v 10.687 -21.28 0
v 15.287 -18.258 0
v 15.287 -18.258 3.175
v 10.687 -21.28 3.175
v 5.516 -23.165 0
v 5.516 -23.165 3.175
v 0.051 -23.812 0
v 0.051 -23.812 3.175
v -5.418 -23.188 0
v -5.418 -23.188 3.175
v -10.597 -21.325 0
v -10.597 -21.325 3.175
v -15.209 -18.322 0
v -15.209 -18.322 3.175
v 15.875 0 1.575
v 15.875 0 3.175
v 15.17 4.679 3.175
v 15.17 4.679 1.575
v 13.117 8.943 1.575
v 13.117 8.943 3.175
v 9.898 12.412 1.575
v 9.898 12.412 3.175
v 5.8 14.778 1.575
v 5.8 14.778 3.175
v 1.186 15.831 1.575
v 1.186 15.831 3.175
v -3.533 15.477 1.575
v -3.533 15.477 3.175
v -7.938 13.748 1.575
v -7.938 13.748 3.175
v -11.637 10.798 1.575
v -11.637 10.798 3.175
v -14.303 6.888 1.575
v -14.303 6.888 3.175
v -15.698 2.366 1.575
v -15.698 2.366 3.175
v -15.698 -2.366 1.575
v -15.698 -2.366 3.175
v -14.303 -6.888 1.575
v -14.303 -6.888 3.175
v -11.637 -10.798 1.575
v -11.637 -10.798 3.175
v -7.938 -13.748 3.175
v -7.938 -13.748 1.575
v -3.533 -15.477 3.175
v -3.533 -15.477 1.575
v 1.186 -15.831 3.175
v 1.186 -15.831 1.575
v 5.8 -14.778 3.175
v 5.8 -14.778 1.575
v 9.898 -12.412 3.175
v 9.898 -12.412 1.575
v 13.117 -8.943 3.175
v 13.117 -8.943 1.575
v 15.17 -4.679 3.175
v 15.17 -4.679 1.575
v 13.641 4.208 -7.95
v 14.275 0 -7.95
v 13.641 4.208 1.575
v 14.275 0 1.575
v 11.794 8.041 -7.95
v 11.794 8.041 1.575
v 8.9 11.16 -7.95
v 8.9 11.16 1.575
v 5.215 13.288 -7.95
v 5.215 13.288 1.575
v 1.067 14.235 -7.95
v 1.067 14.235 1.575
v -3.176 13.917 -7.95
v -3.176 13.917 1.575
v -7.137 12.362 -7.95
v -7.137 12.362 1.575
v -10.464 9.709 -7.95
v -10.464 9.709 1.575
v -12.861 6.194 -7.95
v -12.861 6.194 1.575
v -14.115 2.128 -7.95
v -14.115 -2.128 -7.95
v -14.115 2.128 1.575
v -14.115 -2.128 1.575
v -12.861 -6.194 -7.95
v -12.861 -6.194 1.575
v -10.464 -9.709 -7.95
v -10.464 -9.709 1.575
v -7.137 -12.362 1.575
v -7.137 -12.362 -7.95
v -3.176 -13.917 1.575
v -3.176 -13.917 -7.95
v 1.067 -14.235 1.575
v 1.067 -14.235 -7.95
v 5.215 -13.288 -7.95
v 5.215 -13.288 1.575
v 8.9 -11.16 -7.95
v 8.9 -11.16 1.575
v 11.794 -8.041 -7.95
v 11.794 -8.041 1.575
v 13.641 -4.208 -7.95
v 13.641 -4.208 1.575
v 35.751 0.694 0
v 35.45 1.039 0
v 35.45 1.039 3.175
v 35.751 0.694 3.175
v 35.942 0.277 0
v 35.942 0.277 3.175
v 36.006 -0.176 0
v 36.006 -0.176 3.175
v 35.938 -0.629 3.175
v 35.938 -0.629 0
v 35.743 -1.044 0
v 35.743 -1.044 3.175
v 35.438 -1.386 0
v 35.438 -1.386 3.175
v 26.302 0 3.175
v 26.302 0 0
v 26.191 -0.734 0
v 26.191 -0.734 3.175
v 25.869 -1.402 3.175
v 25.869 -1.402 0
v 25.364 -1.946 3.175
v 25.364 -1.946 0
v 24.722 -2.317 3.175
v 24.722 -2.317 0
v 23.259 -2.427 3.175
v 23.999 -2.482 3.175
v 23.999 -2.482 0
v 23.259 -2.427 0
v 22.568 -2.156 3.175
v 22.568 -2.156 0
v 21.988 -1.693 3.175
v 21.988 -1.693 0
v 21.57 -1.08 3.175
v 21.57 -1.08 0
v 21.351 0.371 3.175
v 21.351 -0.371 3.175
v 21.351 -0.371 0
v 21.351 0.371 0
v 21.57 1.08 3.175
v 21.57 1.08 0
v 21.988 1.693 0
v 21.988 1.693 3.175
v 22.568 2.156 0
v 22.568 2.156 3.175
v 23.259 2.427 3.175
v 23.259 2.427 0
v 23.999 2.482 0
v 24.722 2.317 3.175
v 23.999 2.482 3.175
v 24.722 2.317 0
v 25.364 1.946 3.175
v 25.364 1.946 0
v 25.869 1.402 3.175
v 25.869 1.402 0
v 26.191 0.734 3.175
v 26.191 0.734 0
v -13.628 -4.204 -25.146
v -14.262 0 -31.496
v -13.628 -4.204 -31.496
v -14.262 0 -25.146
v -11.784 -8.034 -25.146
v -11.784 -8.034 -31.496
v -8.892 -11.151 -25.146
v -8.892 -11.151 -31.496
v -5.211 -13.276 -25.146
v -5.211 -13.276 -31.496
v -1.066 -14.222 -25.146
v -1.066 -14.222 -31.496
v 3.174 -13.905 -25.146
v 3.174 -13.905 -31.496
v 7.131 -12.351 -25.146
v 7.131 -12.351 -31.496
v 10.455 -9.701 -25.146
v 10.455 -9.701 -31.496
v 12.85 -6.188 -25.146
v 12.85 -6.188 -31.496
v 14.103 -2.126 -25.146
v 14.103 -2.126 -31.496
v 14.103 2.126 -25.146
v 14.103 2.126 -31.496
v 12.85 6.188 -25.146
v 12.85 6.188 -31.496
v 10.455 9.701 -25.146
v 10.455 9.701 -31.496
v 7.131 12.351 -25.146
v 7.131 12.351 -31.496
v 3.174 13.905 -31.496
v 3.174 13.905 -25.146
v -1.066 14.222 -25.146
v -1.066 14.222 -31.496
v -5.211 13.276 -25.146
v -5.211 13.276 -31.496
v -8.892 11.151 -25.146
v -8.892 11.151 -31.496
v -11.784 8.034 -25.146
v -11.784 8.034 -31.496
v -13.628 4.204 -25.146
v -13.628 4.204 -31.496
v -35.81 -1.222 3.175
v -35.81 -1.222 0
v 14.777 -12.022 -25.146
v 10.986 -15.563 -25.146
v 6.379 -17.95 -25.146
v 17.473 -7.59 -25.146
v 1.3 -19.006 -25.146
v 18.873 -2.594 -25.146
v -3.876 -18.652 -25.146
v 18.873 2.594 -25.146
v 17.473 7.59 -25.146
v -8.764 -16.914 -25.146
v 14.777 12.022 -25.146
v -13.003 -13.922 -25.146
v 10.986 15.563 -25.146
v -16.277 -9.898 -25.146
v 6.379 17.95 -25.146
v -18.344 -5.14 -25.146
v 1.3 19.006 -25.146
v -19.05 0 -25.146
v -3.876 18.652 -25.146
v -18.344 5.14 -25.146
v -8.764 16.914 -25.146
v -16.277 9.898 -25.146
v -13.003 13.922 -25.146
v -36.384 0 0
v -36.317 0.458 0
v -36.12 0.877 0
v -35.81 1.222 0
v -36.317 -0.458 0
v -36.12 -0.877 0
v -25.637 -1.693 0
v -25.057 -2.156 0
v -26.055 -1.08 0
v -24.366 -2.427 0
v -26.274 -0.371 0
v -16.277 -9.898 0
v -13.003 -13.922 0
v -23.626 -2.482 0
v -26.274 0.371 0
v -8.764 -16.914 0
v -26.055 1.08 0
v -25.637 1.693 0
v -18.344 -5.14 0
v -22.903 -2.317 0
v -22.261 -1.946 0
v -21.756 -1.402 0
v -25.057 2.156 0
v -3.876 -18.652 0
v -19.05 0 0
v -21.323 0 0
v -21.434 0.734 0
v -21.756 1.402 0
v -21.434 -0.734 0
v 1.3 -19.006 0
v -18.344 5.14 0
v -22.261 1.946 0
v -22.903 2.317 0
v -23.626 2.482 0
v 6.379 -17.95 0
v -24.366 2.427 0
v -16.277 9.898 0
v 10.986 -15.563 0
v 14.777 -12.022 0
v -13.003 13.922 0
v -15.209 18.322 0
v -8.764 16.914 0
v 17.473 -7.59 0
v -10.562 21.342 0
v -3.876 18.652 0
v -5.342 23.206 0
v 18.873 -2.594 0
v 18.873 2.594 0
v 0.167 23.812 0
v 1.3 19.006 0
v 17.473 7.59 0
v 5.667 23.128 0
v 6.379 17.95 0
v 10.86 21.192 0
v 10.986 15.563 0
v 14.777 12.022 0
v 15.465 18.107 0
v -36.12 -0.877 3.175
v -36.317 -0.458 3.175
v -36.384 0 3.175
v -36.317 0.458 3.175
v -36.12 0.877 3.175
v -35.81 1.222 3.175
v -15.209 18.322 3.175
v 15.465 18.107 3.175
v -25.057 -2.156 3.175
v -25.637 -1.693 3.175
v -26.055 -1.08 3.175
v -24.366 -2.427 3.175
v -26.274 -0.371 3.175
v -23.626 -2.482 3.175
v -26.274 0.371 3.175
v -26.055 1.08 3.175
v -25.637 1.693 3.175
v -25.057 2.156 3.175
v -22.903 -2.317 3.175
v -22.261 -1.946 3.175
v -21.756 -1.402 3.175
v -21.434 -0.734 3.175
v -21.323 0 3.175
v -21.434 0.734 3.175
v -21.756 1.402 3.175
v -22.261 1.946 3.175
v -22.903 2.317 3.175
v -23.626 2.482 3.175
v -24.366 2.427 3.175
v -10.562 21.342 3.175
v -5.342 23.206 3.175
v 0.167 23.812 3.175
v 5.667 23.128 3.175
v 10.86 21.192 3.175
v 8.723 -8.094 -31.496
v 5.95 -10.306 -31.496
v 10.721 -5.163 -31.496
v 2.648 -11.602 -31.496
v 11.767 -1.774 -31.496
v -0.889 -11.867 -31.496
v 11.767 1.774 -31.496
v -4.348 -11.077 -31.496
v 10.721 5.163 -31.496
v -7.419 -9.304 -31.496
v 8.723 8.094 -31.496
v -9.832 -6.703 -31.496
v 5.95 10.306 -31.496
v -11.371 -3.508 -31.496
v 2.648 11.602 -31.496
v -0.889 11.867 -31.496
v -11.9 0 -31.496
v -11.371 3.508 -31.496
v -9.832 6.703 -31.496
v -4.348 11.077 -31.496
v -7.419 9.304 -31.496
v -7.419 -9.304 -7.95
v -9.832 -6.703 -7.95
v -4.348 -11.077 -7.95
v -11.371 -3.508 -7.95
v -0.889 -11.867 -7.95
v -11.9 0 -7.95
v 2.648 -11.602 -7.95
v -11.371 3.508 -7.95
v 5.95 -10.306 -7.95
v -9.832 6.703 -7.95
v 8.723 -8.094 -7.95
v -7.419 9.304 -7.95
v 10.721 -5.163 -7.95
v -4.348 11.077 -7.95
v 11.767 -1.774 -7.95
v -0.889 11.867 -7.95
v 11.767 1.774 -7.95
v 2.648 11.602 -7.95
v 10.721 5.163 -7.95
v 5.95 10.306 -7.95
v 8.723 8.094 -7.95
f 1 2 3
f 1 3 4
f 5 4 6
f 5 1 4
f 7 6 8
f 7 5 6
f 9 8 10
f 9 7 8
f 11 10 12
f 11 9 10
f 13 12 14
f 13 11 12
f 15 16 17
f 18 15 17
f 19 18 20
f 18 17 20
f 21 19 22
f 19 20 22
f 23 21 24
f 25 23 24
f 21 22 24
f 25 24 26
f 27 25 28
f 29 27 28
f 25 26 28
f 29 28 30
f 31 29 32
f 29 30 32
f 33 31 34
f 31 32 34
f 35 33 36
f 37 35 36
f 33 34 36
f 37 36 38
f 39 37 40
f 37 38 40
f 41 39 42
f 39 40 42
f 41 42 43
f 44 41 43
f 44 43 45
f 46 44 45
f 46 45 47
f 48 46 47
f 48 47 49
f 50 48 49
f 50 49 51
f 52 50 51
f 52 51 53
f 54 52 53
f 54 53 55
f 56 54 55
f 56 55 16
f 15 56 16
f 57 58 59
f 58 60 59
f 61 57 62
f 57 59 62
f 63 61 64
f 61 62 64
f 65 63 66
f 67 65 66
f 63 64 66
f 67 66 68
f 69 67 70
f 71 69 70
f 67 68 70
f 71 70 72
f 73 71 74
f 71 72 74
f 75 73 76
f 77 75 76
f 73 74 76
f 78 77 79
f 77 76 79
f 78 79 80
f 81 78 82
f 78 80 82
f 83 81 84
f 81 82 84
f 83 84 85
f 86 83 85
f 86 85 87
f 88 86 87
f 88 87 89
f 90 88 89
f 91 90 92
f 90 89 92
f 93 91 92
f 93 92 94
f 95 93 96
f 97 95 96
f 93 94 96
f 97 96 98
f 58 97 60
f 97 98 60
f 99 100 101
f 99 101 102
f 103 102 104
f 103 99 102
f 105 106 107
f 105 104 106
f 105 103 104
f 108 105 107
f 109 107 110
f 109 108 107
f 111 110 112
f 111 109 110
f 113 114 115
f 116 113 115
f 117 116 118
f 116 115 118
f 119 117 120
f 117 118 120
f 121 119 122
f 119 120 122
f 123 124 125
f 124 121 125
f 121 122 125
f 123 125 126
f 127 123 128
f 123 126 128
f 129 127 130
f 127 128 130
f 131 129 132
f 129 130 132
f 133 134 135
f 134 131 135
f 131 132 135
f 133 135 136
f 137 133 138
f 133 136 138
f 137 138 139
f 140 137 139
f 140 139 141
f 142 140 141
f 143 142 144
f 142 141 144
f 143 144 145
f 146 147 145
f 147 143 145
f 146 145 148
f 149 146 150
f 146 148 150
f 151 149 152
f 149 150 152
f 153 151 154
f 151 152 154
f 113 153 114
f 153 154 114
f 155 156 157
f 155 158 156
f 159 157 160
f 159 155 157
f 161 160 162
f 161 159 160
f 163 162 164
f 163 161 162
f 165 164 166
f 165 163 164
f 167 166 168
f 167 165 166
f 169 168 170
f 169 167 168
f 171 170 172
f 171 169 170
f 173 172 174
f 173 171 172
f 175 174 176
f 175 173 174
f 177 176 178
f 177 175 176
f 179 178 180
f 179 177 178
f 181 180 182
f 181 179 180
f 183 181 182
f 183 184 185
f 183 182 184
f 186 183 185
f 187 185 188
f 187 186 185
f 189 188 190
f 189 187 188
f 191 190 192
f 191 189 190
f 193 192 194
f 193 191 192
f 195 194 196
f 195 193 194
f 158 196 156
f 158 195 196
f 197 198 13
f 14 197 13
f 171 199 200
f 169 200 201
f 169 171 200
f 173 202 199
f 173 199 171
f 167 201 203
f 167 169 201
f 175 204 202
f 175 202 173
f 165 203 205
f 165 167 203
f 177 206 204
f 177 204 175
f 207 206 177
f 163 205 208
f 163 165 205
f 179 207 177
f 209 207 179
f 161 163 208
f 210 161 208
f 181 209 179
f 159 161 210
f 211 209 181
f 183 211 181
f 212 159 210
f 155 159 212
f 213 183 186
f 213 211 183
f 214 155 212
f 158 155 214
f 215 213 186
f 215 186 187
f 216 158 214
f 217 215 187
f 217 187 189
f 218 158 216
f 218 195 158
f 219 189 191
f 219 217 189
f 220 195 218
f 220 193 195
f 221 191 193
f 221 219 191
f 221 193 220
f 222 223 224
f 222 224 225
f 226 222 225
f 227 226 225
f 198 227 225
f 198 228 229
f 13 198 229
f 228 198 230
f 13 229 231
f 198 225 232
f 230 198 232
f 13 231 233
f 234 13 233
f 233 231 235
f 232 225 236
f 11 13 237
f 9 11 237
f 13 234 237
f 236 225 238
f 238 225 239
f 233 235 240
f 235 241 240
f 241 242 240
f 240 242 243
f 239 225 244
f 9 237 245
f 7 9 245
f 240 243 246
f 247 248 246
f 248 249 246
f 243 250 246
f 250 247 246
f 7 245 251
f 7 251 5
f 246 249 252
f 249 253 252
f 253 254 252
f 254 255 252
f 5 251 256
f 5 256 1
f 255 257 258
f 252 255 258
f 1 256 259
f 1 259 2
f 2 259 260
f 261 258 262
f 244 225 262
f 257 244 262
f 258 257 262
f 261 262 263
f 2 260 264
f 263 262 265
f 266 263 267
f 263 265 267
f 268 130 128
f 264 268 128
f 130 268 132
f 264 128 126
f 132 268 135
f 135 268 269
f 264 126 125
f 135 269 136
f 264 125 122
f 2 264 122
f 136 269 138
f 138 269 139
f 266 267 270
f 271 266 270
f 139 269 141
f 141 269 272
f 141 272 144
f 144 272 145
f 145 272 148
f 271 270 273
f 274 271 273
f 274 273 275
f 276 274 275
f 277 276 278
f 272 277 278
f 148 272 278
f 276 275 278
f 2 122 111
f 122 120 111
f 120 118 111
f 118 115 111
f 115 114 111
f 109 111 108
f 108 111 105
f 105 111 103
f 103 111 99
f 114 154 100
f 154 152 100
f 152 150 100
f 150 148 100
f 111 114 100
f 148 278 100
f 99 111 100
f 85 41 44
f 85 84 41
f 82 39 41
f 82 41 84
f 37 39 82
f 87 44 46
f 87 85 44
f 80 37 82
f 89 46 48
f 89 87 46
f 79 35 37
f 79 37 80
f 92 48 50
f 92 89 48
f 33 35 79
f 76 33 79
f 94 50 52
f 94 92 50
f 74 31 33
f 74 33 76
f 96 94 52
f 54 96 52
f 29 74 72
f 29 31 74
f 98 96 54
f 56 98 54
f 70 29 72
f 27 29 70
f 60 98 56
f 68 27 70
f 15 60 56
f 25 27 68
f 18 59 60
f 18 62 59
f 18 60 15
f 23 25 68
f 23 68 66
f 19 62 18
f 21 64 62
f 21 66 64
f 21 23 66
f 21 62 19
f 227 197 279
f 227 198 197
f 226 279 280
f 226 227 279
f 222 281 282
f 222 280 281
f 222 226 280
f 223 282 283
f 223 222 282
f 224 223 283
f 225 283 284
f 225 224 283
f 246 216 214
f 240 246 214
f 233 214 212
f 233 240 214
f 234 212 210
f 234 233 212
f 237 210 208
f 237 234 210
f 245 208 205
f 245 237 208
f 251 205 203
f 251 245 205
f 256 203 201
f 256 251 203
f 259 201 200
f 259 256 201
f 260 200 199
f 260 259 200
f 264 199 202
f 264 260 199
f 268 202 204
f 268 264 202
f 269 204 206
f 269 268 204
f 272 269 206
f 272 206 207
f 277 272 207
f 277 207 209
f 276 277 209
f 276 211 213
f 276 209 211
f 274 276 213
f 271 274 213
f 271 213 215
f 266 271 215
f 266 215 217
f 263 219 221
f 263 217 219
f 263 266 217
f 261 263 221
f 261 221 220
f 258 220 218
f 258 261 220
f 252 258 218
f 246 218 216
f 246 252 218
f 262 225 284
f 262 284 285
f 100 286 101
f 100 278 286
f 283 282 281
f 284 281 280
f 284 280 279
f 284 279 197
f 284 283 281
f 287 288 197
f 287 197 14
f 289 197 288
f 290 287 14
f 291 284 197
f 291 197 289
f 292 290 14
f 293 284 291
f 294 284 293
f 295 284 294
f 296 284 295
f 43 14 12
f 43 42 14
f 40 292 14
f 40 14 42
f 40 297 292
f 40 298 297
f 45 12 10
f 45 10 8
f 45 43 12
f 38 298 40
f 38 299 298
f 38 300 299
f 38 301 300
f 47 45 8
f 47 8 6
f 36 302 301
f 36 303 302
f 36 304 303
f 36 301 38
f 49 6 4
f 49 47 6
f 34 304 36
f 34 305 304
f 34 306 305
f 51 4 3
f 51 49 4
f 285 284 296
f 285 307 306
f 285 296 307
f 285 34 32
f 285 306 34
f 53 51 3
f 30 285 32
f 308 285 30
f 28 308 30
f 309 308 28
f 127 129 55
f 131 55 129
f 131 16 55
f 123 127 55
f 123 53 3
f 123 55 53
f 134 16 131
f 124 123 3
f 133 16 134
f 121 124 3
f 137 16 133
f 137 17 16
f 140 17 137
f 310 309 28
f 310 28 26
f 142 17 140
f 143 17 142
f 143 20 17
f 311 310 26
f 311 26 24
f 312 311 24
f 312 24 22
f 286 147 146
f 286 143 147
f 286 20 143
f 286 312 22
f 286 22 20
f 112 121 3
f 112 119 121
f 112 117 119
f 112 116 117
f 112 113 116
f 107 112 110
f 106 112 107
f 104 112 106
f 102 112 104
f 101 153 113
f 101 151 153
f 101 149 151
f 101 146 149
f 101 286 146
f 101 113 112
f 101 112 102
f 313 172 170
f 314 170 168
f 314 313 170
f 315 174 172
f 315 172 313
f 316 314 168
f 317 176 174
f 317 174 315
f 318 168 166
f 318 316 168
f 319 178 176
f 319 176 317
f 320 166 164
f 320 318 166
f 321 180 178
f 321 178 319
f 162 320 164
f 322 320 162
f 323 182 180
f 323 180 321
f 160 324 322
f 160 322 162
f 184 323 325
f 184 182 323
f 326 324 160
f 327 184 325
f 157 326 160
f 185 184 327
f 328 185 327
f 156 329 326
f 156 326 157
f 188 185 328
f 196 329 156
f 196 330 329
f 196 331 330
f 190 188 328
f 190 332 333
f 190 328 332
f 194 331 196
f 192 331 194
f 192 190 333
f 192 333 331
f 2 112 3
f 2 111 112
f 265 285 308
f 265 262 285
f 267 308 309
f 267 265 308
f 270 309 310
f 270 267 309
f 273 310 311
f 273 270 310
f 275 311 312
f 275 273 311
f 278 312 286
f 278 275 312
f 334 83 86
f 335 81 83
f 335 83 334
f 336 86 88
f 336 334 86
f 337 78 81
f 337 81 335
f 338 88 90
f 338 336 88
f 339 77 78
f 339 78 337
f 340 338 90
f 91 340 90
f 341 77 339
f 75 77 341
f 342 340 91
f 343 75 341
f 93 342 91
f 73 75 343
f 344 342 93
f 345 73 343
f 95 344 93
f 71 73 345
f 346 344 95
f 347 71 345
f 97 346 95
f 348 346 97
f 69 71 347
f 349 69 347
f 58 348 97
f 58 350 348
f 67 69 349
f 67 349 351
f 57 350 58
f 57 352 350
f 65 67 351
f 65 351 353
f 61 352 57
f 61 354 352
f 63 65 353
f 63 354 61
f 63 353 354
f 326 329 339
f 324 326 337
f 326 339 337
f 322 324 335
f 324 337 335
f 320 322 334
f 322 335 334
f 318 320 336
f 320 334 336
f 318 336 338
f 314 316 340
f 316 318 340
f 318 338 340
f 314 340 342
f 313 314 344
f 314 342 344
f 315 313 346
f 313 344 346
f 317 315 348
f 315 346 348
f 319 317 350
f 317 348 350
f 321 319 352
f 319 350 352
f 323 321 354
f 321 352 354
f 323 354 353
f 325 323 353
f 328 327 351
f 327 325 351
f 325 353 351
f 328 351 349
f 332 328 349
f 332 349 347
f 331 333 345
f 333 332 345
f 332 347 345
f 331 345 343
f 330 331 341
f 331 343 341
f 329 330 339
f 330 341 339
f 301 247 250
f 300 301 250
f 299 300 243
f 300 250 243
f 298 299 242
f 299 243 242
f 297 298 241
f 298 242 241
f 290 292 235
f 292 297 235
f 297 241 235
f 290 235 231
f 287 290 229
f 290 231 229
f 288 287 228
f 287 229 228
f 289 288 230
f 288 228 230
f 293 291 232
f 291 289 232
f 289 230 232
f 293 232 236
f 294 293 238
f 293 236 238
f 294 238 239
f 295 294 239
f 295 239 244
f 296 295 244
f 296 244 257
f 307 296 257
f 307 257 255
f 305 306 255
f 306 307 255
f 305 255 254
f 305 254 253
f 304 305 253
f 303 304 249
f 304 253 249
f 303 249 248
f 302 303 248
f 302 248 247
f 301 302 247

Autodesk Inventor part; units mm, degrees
ref_plane "YZ Plane" through (0, 0, 0) normal (1, 0, 0) x (0, 1, 0)
ref_plane "XZ Plane" through (0, 0, 0) normal (0, 1, 0) x (-1, 0, 0)
ref_plane "XY Plane" through (0, 0, 0) normal (0, 0, 1) x (1, 0, 0)
sketch "Sketch2" plane through (0, 0, 0) normal (0, 0, 1) x (1, 0, 0)
  arc A0 (-35.8105, 1.2215) -> (-35.8105, -1.2215) centre (-34.7965, 0) ccw
  arc A1 (35.4376, -1.3856) -> (35.4495, 1.0387) centre (34.4185, -0.1685) ccw
  line L0 (-35.8105, 1.2215) -> (-15.2094, 18.3224)
  line L1 (-35.8105, -1.2215) -> (-15.2094, -18.3224)
  line L2 (-73.8497, 0) -> (129.1726, 0) construction
  line L3 (15.465, 18.1071) -> (35.4495, 1.0387)
  line L4 (35.4376, -1.3856) -> (15.2871, -18.2576)
  line L5 (-36.384, 17.9881) -> (-36.384, -16.5847) construction
  line L6 (36.006, 40.1283) -> (36.006, -35.2466) construction
  circle A2 centre (-23.8125, 0) radius 2.4892
  circle A3 centre (23.8125, 0) radius 2.4892
  circle A4 centre (0, 0) radius 11.8999
  arc A5 (-15.2094, -18.3224) -> (15.2871, -18.2576) centre (0, 0) ccw
  arc A6 (15.465, 18.1071) -> (-15.2094, 18.3224) centre (0, 0) ccw
  dimension "d6" = 3.175
  dimension "d7" = 72.39
  dimension "d8" = 23.7998
  dimension "d9" = 4.9784
extrude "Extrusion1" add sketch "Sketch2" along normal blind 3.175
sketch "Sketch3" plane through (0, 0, 0) normal (0, 0, -1) x (-1, 0, 0)
  circle A0 centre (0, 0) radius 19.05
  circle A1 centre (0, 0) radius 11.8999 projected
  dimension "d12" = 38.1
extrude "Extrusion2" add sketch "Sketch3" along normal blind 25.146
sketch "Sketch4" plane through (0, 0, -25.146) normal (0, 0, -1) x (-1, 0, 0)
  circle A0 centre (0, 0) radius 11.8999 projected
  circle A1 centre (0, 0) radius 14.2621
  dimension "d15" = 28.5242
extrude "Extrusion3" add sketch "Sketch4" along normal blind 6.35
sketch "Sketch5" plane through (0, 0, 3.175) normal (0, 0, 1) x (1, 0, 0)
  circle A0 centre (0, 0) radius 11.8999 projected
  circle A1 centre (0, 0) radius 15.875
  dimension "d18" = 31.75
extrude "Extrusion4" cut sketch "Sketch5" against normal blind 1.6002
sketch "Sketch6" plane through (0, 0, 1.5748) normal (0, 0, 1) x (1, 0, 0)
  circle A0 centre (0, 0) radius 14.2748
  circle A1 centre (0, 0) radius 11.8999 projected
  dimension "d21" = 28.5496
extrude "Extrusion5" cut sketch "Sketch6" against normal blind 9.525
properties part number "Bearing Block WCP"
